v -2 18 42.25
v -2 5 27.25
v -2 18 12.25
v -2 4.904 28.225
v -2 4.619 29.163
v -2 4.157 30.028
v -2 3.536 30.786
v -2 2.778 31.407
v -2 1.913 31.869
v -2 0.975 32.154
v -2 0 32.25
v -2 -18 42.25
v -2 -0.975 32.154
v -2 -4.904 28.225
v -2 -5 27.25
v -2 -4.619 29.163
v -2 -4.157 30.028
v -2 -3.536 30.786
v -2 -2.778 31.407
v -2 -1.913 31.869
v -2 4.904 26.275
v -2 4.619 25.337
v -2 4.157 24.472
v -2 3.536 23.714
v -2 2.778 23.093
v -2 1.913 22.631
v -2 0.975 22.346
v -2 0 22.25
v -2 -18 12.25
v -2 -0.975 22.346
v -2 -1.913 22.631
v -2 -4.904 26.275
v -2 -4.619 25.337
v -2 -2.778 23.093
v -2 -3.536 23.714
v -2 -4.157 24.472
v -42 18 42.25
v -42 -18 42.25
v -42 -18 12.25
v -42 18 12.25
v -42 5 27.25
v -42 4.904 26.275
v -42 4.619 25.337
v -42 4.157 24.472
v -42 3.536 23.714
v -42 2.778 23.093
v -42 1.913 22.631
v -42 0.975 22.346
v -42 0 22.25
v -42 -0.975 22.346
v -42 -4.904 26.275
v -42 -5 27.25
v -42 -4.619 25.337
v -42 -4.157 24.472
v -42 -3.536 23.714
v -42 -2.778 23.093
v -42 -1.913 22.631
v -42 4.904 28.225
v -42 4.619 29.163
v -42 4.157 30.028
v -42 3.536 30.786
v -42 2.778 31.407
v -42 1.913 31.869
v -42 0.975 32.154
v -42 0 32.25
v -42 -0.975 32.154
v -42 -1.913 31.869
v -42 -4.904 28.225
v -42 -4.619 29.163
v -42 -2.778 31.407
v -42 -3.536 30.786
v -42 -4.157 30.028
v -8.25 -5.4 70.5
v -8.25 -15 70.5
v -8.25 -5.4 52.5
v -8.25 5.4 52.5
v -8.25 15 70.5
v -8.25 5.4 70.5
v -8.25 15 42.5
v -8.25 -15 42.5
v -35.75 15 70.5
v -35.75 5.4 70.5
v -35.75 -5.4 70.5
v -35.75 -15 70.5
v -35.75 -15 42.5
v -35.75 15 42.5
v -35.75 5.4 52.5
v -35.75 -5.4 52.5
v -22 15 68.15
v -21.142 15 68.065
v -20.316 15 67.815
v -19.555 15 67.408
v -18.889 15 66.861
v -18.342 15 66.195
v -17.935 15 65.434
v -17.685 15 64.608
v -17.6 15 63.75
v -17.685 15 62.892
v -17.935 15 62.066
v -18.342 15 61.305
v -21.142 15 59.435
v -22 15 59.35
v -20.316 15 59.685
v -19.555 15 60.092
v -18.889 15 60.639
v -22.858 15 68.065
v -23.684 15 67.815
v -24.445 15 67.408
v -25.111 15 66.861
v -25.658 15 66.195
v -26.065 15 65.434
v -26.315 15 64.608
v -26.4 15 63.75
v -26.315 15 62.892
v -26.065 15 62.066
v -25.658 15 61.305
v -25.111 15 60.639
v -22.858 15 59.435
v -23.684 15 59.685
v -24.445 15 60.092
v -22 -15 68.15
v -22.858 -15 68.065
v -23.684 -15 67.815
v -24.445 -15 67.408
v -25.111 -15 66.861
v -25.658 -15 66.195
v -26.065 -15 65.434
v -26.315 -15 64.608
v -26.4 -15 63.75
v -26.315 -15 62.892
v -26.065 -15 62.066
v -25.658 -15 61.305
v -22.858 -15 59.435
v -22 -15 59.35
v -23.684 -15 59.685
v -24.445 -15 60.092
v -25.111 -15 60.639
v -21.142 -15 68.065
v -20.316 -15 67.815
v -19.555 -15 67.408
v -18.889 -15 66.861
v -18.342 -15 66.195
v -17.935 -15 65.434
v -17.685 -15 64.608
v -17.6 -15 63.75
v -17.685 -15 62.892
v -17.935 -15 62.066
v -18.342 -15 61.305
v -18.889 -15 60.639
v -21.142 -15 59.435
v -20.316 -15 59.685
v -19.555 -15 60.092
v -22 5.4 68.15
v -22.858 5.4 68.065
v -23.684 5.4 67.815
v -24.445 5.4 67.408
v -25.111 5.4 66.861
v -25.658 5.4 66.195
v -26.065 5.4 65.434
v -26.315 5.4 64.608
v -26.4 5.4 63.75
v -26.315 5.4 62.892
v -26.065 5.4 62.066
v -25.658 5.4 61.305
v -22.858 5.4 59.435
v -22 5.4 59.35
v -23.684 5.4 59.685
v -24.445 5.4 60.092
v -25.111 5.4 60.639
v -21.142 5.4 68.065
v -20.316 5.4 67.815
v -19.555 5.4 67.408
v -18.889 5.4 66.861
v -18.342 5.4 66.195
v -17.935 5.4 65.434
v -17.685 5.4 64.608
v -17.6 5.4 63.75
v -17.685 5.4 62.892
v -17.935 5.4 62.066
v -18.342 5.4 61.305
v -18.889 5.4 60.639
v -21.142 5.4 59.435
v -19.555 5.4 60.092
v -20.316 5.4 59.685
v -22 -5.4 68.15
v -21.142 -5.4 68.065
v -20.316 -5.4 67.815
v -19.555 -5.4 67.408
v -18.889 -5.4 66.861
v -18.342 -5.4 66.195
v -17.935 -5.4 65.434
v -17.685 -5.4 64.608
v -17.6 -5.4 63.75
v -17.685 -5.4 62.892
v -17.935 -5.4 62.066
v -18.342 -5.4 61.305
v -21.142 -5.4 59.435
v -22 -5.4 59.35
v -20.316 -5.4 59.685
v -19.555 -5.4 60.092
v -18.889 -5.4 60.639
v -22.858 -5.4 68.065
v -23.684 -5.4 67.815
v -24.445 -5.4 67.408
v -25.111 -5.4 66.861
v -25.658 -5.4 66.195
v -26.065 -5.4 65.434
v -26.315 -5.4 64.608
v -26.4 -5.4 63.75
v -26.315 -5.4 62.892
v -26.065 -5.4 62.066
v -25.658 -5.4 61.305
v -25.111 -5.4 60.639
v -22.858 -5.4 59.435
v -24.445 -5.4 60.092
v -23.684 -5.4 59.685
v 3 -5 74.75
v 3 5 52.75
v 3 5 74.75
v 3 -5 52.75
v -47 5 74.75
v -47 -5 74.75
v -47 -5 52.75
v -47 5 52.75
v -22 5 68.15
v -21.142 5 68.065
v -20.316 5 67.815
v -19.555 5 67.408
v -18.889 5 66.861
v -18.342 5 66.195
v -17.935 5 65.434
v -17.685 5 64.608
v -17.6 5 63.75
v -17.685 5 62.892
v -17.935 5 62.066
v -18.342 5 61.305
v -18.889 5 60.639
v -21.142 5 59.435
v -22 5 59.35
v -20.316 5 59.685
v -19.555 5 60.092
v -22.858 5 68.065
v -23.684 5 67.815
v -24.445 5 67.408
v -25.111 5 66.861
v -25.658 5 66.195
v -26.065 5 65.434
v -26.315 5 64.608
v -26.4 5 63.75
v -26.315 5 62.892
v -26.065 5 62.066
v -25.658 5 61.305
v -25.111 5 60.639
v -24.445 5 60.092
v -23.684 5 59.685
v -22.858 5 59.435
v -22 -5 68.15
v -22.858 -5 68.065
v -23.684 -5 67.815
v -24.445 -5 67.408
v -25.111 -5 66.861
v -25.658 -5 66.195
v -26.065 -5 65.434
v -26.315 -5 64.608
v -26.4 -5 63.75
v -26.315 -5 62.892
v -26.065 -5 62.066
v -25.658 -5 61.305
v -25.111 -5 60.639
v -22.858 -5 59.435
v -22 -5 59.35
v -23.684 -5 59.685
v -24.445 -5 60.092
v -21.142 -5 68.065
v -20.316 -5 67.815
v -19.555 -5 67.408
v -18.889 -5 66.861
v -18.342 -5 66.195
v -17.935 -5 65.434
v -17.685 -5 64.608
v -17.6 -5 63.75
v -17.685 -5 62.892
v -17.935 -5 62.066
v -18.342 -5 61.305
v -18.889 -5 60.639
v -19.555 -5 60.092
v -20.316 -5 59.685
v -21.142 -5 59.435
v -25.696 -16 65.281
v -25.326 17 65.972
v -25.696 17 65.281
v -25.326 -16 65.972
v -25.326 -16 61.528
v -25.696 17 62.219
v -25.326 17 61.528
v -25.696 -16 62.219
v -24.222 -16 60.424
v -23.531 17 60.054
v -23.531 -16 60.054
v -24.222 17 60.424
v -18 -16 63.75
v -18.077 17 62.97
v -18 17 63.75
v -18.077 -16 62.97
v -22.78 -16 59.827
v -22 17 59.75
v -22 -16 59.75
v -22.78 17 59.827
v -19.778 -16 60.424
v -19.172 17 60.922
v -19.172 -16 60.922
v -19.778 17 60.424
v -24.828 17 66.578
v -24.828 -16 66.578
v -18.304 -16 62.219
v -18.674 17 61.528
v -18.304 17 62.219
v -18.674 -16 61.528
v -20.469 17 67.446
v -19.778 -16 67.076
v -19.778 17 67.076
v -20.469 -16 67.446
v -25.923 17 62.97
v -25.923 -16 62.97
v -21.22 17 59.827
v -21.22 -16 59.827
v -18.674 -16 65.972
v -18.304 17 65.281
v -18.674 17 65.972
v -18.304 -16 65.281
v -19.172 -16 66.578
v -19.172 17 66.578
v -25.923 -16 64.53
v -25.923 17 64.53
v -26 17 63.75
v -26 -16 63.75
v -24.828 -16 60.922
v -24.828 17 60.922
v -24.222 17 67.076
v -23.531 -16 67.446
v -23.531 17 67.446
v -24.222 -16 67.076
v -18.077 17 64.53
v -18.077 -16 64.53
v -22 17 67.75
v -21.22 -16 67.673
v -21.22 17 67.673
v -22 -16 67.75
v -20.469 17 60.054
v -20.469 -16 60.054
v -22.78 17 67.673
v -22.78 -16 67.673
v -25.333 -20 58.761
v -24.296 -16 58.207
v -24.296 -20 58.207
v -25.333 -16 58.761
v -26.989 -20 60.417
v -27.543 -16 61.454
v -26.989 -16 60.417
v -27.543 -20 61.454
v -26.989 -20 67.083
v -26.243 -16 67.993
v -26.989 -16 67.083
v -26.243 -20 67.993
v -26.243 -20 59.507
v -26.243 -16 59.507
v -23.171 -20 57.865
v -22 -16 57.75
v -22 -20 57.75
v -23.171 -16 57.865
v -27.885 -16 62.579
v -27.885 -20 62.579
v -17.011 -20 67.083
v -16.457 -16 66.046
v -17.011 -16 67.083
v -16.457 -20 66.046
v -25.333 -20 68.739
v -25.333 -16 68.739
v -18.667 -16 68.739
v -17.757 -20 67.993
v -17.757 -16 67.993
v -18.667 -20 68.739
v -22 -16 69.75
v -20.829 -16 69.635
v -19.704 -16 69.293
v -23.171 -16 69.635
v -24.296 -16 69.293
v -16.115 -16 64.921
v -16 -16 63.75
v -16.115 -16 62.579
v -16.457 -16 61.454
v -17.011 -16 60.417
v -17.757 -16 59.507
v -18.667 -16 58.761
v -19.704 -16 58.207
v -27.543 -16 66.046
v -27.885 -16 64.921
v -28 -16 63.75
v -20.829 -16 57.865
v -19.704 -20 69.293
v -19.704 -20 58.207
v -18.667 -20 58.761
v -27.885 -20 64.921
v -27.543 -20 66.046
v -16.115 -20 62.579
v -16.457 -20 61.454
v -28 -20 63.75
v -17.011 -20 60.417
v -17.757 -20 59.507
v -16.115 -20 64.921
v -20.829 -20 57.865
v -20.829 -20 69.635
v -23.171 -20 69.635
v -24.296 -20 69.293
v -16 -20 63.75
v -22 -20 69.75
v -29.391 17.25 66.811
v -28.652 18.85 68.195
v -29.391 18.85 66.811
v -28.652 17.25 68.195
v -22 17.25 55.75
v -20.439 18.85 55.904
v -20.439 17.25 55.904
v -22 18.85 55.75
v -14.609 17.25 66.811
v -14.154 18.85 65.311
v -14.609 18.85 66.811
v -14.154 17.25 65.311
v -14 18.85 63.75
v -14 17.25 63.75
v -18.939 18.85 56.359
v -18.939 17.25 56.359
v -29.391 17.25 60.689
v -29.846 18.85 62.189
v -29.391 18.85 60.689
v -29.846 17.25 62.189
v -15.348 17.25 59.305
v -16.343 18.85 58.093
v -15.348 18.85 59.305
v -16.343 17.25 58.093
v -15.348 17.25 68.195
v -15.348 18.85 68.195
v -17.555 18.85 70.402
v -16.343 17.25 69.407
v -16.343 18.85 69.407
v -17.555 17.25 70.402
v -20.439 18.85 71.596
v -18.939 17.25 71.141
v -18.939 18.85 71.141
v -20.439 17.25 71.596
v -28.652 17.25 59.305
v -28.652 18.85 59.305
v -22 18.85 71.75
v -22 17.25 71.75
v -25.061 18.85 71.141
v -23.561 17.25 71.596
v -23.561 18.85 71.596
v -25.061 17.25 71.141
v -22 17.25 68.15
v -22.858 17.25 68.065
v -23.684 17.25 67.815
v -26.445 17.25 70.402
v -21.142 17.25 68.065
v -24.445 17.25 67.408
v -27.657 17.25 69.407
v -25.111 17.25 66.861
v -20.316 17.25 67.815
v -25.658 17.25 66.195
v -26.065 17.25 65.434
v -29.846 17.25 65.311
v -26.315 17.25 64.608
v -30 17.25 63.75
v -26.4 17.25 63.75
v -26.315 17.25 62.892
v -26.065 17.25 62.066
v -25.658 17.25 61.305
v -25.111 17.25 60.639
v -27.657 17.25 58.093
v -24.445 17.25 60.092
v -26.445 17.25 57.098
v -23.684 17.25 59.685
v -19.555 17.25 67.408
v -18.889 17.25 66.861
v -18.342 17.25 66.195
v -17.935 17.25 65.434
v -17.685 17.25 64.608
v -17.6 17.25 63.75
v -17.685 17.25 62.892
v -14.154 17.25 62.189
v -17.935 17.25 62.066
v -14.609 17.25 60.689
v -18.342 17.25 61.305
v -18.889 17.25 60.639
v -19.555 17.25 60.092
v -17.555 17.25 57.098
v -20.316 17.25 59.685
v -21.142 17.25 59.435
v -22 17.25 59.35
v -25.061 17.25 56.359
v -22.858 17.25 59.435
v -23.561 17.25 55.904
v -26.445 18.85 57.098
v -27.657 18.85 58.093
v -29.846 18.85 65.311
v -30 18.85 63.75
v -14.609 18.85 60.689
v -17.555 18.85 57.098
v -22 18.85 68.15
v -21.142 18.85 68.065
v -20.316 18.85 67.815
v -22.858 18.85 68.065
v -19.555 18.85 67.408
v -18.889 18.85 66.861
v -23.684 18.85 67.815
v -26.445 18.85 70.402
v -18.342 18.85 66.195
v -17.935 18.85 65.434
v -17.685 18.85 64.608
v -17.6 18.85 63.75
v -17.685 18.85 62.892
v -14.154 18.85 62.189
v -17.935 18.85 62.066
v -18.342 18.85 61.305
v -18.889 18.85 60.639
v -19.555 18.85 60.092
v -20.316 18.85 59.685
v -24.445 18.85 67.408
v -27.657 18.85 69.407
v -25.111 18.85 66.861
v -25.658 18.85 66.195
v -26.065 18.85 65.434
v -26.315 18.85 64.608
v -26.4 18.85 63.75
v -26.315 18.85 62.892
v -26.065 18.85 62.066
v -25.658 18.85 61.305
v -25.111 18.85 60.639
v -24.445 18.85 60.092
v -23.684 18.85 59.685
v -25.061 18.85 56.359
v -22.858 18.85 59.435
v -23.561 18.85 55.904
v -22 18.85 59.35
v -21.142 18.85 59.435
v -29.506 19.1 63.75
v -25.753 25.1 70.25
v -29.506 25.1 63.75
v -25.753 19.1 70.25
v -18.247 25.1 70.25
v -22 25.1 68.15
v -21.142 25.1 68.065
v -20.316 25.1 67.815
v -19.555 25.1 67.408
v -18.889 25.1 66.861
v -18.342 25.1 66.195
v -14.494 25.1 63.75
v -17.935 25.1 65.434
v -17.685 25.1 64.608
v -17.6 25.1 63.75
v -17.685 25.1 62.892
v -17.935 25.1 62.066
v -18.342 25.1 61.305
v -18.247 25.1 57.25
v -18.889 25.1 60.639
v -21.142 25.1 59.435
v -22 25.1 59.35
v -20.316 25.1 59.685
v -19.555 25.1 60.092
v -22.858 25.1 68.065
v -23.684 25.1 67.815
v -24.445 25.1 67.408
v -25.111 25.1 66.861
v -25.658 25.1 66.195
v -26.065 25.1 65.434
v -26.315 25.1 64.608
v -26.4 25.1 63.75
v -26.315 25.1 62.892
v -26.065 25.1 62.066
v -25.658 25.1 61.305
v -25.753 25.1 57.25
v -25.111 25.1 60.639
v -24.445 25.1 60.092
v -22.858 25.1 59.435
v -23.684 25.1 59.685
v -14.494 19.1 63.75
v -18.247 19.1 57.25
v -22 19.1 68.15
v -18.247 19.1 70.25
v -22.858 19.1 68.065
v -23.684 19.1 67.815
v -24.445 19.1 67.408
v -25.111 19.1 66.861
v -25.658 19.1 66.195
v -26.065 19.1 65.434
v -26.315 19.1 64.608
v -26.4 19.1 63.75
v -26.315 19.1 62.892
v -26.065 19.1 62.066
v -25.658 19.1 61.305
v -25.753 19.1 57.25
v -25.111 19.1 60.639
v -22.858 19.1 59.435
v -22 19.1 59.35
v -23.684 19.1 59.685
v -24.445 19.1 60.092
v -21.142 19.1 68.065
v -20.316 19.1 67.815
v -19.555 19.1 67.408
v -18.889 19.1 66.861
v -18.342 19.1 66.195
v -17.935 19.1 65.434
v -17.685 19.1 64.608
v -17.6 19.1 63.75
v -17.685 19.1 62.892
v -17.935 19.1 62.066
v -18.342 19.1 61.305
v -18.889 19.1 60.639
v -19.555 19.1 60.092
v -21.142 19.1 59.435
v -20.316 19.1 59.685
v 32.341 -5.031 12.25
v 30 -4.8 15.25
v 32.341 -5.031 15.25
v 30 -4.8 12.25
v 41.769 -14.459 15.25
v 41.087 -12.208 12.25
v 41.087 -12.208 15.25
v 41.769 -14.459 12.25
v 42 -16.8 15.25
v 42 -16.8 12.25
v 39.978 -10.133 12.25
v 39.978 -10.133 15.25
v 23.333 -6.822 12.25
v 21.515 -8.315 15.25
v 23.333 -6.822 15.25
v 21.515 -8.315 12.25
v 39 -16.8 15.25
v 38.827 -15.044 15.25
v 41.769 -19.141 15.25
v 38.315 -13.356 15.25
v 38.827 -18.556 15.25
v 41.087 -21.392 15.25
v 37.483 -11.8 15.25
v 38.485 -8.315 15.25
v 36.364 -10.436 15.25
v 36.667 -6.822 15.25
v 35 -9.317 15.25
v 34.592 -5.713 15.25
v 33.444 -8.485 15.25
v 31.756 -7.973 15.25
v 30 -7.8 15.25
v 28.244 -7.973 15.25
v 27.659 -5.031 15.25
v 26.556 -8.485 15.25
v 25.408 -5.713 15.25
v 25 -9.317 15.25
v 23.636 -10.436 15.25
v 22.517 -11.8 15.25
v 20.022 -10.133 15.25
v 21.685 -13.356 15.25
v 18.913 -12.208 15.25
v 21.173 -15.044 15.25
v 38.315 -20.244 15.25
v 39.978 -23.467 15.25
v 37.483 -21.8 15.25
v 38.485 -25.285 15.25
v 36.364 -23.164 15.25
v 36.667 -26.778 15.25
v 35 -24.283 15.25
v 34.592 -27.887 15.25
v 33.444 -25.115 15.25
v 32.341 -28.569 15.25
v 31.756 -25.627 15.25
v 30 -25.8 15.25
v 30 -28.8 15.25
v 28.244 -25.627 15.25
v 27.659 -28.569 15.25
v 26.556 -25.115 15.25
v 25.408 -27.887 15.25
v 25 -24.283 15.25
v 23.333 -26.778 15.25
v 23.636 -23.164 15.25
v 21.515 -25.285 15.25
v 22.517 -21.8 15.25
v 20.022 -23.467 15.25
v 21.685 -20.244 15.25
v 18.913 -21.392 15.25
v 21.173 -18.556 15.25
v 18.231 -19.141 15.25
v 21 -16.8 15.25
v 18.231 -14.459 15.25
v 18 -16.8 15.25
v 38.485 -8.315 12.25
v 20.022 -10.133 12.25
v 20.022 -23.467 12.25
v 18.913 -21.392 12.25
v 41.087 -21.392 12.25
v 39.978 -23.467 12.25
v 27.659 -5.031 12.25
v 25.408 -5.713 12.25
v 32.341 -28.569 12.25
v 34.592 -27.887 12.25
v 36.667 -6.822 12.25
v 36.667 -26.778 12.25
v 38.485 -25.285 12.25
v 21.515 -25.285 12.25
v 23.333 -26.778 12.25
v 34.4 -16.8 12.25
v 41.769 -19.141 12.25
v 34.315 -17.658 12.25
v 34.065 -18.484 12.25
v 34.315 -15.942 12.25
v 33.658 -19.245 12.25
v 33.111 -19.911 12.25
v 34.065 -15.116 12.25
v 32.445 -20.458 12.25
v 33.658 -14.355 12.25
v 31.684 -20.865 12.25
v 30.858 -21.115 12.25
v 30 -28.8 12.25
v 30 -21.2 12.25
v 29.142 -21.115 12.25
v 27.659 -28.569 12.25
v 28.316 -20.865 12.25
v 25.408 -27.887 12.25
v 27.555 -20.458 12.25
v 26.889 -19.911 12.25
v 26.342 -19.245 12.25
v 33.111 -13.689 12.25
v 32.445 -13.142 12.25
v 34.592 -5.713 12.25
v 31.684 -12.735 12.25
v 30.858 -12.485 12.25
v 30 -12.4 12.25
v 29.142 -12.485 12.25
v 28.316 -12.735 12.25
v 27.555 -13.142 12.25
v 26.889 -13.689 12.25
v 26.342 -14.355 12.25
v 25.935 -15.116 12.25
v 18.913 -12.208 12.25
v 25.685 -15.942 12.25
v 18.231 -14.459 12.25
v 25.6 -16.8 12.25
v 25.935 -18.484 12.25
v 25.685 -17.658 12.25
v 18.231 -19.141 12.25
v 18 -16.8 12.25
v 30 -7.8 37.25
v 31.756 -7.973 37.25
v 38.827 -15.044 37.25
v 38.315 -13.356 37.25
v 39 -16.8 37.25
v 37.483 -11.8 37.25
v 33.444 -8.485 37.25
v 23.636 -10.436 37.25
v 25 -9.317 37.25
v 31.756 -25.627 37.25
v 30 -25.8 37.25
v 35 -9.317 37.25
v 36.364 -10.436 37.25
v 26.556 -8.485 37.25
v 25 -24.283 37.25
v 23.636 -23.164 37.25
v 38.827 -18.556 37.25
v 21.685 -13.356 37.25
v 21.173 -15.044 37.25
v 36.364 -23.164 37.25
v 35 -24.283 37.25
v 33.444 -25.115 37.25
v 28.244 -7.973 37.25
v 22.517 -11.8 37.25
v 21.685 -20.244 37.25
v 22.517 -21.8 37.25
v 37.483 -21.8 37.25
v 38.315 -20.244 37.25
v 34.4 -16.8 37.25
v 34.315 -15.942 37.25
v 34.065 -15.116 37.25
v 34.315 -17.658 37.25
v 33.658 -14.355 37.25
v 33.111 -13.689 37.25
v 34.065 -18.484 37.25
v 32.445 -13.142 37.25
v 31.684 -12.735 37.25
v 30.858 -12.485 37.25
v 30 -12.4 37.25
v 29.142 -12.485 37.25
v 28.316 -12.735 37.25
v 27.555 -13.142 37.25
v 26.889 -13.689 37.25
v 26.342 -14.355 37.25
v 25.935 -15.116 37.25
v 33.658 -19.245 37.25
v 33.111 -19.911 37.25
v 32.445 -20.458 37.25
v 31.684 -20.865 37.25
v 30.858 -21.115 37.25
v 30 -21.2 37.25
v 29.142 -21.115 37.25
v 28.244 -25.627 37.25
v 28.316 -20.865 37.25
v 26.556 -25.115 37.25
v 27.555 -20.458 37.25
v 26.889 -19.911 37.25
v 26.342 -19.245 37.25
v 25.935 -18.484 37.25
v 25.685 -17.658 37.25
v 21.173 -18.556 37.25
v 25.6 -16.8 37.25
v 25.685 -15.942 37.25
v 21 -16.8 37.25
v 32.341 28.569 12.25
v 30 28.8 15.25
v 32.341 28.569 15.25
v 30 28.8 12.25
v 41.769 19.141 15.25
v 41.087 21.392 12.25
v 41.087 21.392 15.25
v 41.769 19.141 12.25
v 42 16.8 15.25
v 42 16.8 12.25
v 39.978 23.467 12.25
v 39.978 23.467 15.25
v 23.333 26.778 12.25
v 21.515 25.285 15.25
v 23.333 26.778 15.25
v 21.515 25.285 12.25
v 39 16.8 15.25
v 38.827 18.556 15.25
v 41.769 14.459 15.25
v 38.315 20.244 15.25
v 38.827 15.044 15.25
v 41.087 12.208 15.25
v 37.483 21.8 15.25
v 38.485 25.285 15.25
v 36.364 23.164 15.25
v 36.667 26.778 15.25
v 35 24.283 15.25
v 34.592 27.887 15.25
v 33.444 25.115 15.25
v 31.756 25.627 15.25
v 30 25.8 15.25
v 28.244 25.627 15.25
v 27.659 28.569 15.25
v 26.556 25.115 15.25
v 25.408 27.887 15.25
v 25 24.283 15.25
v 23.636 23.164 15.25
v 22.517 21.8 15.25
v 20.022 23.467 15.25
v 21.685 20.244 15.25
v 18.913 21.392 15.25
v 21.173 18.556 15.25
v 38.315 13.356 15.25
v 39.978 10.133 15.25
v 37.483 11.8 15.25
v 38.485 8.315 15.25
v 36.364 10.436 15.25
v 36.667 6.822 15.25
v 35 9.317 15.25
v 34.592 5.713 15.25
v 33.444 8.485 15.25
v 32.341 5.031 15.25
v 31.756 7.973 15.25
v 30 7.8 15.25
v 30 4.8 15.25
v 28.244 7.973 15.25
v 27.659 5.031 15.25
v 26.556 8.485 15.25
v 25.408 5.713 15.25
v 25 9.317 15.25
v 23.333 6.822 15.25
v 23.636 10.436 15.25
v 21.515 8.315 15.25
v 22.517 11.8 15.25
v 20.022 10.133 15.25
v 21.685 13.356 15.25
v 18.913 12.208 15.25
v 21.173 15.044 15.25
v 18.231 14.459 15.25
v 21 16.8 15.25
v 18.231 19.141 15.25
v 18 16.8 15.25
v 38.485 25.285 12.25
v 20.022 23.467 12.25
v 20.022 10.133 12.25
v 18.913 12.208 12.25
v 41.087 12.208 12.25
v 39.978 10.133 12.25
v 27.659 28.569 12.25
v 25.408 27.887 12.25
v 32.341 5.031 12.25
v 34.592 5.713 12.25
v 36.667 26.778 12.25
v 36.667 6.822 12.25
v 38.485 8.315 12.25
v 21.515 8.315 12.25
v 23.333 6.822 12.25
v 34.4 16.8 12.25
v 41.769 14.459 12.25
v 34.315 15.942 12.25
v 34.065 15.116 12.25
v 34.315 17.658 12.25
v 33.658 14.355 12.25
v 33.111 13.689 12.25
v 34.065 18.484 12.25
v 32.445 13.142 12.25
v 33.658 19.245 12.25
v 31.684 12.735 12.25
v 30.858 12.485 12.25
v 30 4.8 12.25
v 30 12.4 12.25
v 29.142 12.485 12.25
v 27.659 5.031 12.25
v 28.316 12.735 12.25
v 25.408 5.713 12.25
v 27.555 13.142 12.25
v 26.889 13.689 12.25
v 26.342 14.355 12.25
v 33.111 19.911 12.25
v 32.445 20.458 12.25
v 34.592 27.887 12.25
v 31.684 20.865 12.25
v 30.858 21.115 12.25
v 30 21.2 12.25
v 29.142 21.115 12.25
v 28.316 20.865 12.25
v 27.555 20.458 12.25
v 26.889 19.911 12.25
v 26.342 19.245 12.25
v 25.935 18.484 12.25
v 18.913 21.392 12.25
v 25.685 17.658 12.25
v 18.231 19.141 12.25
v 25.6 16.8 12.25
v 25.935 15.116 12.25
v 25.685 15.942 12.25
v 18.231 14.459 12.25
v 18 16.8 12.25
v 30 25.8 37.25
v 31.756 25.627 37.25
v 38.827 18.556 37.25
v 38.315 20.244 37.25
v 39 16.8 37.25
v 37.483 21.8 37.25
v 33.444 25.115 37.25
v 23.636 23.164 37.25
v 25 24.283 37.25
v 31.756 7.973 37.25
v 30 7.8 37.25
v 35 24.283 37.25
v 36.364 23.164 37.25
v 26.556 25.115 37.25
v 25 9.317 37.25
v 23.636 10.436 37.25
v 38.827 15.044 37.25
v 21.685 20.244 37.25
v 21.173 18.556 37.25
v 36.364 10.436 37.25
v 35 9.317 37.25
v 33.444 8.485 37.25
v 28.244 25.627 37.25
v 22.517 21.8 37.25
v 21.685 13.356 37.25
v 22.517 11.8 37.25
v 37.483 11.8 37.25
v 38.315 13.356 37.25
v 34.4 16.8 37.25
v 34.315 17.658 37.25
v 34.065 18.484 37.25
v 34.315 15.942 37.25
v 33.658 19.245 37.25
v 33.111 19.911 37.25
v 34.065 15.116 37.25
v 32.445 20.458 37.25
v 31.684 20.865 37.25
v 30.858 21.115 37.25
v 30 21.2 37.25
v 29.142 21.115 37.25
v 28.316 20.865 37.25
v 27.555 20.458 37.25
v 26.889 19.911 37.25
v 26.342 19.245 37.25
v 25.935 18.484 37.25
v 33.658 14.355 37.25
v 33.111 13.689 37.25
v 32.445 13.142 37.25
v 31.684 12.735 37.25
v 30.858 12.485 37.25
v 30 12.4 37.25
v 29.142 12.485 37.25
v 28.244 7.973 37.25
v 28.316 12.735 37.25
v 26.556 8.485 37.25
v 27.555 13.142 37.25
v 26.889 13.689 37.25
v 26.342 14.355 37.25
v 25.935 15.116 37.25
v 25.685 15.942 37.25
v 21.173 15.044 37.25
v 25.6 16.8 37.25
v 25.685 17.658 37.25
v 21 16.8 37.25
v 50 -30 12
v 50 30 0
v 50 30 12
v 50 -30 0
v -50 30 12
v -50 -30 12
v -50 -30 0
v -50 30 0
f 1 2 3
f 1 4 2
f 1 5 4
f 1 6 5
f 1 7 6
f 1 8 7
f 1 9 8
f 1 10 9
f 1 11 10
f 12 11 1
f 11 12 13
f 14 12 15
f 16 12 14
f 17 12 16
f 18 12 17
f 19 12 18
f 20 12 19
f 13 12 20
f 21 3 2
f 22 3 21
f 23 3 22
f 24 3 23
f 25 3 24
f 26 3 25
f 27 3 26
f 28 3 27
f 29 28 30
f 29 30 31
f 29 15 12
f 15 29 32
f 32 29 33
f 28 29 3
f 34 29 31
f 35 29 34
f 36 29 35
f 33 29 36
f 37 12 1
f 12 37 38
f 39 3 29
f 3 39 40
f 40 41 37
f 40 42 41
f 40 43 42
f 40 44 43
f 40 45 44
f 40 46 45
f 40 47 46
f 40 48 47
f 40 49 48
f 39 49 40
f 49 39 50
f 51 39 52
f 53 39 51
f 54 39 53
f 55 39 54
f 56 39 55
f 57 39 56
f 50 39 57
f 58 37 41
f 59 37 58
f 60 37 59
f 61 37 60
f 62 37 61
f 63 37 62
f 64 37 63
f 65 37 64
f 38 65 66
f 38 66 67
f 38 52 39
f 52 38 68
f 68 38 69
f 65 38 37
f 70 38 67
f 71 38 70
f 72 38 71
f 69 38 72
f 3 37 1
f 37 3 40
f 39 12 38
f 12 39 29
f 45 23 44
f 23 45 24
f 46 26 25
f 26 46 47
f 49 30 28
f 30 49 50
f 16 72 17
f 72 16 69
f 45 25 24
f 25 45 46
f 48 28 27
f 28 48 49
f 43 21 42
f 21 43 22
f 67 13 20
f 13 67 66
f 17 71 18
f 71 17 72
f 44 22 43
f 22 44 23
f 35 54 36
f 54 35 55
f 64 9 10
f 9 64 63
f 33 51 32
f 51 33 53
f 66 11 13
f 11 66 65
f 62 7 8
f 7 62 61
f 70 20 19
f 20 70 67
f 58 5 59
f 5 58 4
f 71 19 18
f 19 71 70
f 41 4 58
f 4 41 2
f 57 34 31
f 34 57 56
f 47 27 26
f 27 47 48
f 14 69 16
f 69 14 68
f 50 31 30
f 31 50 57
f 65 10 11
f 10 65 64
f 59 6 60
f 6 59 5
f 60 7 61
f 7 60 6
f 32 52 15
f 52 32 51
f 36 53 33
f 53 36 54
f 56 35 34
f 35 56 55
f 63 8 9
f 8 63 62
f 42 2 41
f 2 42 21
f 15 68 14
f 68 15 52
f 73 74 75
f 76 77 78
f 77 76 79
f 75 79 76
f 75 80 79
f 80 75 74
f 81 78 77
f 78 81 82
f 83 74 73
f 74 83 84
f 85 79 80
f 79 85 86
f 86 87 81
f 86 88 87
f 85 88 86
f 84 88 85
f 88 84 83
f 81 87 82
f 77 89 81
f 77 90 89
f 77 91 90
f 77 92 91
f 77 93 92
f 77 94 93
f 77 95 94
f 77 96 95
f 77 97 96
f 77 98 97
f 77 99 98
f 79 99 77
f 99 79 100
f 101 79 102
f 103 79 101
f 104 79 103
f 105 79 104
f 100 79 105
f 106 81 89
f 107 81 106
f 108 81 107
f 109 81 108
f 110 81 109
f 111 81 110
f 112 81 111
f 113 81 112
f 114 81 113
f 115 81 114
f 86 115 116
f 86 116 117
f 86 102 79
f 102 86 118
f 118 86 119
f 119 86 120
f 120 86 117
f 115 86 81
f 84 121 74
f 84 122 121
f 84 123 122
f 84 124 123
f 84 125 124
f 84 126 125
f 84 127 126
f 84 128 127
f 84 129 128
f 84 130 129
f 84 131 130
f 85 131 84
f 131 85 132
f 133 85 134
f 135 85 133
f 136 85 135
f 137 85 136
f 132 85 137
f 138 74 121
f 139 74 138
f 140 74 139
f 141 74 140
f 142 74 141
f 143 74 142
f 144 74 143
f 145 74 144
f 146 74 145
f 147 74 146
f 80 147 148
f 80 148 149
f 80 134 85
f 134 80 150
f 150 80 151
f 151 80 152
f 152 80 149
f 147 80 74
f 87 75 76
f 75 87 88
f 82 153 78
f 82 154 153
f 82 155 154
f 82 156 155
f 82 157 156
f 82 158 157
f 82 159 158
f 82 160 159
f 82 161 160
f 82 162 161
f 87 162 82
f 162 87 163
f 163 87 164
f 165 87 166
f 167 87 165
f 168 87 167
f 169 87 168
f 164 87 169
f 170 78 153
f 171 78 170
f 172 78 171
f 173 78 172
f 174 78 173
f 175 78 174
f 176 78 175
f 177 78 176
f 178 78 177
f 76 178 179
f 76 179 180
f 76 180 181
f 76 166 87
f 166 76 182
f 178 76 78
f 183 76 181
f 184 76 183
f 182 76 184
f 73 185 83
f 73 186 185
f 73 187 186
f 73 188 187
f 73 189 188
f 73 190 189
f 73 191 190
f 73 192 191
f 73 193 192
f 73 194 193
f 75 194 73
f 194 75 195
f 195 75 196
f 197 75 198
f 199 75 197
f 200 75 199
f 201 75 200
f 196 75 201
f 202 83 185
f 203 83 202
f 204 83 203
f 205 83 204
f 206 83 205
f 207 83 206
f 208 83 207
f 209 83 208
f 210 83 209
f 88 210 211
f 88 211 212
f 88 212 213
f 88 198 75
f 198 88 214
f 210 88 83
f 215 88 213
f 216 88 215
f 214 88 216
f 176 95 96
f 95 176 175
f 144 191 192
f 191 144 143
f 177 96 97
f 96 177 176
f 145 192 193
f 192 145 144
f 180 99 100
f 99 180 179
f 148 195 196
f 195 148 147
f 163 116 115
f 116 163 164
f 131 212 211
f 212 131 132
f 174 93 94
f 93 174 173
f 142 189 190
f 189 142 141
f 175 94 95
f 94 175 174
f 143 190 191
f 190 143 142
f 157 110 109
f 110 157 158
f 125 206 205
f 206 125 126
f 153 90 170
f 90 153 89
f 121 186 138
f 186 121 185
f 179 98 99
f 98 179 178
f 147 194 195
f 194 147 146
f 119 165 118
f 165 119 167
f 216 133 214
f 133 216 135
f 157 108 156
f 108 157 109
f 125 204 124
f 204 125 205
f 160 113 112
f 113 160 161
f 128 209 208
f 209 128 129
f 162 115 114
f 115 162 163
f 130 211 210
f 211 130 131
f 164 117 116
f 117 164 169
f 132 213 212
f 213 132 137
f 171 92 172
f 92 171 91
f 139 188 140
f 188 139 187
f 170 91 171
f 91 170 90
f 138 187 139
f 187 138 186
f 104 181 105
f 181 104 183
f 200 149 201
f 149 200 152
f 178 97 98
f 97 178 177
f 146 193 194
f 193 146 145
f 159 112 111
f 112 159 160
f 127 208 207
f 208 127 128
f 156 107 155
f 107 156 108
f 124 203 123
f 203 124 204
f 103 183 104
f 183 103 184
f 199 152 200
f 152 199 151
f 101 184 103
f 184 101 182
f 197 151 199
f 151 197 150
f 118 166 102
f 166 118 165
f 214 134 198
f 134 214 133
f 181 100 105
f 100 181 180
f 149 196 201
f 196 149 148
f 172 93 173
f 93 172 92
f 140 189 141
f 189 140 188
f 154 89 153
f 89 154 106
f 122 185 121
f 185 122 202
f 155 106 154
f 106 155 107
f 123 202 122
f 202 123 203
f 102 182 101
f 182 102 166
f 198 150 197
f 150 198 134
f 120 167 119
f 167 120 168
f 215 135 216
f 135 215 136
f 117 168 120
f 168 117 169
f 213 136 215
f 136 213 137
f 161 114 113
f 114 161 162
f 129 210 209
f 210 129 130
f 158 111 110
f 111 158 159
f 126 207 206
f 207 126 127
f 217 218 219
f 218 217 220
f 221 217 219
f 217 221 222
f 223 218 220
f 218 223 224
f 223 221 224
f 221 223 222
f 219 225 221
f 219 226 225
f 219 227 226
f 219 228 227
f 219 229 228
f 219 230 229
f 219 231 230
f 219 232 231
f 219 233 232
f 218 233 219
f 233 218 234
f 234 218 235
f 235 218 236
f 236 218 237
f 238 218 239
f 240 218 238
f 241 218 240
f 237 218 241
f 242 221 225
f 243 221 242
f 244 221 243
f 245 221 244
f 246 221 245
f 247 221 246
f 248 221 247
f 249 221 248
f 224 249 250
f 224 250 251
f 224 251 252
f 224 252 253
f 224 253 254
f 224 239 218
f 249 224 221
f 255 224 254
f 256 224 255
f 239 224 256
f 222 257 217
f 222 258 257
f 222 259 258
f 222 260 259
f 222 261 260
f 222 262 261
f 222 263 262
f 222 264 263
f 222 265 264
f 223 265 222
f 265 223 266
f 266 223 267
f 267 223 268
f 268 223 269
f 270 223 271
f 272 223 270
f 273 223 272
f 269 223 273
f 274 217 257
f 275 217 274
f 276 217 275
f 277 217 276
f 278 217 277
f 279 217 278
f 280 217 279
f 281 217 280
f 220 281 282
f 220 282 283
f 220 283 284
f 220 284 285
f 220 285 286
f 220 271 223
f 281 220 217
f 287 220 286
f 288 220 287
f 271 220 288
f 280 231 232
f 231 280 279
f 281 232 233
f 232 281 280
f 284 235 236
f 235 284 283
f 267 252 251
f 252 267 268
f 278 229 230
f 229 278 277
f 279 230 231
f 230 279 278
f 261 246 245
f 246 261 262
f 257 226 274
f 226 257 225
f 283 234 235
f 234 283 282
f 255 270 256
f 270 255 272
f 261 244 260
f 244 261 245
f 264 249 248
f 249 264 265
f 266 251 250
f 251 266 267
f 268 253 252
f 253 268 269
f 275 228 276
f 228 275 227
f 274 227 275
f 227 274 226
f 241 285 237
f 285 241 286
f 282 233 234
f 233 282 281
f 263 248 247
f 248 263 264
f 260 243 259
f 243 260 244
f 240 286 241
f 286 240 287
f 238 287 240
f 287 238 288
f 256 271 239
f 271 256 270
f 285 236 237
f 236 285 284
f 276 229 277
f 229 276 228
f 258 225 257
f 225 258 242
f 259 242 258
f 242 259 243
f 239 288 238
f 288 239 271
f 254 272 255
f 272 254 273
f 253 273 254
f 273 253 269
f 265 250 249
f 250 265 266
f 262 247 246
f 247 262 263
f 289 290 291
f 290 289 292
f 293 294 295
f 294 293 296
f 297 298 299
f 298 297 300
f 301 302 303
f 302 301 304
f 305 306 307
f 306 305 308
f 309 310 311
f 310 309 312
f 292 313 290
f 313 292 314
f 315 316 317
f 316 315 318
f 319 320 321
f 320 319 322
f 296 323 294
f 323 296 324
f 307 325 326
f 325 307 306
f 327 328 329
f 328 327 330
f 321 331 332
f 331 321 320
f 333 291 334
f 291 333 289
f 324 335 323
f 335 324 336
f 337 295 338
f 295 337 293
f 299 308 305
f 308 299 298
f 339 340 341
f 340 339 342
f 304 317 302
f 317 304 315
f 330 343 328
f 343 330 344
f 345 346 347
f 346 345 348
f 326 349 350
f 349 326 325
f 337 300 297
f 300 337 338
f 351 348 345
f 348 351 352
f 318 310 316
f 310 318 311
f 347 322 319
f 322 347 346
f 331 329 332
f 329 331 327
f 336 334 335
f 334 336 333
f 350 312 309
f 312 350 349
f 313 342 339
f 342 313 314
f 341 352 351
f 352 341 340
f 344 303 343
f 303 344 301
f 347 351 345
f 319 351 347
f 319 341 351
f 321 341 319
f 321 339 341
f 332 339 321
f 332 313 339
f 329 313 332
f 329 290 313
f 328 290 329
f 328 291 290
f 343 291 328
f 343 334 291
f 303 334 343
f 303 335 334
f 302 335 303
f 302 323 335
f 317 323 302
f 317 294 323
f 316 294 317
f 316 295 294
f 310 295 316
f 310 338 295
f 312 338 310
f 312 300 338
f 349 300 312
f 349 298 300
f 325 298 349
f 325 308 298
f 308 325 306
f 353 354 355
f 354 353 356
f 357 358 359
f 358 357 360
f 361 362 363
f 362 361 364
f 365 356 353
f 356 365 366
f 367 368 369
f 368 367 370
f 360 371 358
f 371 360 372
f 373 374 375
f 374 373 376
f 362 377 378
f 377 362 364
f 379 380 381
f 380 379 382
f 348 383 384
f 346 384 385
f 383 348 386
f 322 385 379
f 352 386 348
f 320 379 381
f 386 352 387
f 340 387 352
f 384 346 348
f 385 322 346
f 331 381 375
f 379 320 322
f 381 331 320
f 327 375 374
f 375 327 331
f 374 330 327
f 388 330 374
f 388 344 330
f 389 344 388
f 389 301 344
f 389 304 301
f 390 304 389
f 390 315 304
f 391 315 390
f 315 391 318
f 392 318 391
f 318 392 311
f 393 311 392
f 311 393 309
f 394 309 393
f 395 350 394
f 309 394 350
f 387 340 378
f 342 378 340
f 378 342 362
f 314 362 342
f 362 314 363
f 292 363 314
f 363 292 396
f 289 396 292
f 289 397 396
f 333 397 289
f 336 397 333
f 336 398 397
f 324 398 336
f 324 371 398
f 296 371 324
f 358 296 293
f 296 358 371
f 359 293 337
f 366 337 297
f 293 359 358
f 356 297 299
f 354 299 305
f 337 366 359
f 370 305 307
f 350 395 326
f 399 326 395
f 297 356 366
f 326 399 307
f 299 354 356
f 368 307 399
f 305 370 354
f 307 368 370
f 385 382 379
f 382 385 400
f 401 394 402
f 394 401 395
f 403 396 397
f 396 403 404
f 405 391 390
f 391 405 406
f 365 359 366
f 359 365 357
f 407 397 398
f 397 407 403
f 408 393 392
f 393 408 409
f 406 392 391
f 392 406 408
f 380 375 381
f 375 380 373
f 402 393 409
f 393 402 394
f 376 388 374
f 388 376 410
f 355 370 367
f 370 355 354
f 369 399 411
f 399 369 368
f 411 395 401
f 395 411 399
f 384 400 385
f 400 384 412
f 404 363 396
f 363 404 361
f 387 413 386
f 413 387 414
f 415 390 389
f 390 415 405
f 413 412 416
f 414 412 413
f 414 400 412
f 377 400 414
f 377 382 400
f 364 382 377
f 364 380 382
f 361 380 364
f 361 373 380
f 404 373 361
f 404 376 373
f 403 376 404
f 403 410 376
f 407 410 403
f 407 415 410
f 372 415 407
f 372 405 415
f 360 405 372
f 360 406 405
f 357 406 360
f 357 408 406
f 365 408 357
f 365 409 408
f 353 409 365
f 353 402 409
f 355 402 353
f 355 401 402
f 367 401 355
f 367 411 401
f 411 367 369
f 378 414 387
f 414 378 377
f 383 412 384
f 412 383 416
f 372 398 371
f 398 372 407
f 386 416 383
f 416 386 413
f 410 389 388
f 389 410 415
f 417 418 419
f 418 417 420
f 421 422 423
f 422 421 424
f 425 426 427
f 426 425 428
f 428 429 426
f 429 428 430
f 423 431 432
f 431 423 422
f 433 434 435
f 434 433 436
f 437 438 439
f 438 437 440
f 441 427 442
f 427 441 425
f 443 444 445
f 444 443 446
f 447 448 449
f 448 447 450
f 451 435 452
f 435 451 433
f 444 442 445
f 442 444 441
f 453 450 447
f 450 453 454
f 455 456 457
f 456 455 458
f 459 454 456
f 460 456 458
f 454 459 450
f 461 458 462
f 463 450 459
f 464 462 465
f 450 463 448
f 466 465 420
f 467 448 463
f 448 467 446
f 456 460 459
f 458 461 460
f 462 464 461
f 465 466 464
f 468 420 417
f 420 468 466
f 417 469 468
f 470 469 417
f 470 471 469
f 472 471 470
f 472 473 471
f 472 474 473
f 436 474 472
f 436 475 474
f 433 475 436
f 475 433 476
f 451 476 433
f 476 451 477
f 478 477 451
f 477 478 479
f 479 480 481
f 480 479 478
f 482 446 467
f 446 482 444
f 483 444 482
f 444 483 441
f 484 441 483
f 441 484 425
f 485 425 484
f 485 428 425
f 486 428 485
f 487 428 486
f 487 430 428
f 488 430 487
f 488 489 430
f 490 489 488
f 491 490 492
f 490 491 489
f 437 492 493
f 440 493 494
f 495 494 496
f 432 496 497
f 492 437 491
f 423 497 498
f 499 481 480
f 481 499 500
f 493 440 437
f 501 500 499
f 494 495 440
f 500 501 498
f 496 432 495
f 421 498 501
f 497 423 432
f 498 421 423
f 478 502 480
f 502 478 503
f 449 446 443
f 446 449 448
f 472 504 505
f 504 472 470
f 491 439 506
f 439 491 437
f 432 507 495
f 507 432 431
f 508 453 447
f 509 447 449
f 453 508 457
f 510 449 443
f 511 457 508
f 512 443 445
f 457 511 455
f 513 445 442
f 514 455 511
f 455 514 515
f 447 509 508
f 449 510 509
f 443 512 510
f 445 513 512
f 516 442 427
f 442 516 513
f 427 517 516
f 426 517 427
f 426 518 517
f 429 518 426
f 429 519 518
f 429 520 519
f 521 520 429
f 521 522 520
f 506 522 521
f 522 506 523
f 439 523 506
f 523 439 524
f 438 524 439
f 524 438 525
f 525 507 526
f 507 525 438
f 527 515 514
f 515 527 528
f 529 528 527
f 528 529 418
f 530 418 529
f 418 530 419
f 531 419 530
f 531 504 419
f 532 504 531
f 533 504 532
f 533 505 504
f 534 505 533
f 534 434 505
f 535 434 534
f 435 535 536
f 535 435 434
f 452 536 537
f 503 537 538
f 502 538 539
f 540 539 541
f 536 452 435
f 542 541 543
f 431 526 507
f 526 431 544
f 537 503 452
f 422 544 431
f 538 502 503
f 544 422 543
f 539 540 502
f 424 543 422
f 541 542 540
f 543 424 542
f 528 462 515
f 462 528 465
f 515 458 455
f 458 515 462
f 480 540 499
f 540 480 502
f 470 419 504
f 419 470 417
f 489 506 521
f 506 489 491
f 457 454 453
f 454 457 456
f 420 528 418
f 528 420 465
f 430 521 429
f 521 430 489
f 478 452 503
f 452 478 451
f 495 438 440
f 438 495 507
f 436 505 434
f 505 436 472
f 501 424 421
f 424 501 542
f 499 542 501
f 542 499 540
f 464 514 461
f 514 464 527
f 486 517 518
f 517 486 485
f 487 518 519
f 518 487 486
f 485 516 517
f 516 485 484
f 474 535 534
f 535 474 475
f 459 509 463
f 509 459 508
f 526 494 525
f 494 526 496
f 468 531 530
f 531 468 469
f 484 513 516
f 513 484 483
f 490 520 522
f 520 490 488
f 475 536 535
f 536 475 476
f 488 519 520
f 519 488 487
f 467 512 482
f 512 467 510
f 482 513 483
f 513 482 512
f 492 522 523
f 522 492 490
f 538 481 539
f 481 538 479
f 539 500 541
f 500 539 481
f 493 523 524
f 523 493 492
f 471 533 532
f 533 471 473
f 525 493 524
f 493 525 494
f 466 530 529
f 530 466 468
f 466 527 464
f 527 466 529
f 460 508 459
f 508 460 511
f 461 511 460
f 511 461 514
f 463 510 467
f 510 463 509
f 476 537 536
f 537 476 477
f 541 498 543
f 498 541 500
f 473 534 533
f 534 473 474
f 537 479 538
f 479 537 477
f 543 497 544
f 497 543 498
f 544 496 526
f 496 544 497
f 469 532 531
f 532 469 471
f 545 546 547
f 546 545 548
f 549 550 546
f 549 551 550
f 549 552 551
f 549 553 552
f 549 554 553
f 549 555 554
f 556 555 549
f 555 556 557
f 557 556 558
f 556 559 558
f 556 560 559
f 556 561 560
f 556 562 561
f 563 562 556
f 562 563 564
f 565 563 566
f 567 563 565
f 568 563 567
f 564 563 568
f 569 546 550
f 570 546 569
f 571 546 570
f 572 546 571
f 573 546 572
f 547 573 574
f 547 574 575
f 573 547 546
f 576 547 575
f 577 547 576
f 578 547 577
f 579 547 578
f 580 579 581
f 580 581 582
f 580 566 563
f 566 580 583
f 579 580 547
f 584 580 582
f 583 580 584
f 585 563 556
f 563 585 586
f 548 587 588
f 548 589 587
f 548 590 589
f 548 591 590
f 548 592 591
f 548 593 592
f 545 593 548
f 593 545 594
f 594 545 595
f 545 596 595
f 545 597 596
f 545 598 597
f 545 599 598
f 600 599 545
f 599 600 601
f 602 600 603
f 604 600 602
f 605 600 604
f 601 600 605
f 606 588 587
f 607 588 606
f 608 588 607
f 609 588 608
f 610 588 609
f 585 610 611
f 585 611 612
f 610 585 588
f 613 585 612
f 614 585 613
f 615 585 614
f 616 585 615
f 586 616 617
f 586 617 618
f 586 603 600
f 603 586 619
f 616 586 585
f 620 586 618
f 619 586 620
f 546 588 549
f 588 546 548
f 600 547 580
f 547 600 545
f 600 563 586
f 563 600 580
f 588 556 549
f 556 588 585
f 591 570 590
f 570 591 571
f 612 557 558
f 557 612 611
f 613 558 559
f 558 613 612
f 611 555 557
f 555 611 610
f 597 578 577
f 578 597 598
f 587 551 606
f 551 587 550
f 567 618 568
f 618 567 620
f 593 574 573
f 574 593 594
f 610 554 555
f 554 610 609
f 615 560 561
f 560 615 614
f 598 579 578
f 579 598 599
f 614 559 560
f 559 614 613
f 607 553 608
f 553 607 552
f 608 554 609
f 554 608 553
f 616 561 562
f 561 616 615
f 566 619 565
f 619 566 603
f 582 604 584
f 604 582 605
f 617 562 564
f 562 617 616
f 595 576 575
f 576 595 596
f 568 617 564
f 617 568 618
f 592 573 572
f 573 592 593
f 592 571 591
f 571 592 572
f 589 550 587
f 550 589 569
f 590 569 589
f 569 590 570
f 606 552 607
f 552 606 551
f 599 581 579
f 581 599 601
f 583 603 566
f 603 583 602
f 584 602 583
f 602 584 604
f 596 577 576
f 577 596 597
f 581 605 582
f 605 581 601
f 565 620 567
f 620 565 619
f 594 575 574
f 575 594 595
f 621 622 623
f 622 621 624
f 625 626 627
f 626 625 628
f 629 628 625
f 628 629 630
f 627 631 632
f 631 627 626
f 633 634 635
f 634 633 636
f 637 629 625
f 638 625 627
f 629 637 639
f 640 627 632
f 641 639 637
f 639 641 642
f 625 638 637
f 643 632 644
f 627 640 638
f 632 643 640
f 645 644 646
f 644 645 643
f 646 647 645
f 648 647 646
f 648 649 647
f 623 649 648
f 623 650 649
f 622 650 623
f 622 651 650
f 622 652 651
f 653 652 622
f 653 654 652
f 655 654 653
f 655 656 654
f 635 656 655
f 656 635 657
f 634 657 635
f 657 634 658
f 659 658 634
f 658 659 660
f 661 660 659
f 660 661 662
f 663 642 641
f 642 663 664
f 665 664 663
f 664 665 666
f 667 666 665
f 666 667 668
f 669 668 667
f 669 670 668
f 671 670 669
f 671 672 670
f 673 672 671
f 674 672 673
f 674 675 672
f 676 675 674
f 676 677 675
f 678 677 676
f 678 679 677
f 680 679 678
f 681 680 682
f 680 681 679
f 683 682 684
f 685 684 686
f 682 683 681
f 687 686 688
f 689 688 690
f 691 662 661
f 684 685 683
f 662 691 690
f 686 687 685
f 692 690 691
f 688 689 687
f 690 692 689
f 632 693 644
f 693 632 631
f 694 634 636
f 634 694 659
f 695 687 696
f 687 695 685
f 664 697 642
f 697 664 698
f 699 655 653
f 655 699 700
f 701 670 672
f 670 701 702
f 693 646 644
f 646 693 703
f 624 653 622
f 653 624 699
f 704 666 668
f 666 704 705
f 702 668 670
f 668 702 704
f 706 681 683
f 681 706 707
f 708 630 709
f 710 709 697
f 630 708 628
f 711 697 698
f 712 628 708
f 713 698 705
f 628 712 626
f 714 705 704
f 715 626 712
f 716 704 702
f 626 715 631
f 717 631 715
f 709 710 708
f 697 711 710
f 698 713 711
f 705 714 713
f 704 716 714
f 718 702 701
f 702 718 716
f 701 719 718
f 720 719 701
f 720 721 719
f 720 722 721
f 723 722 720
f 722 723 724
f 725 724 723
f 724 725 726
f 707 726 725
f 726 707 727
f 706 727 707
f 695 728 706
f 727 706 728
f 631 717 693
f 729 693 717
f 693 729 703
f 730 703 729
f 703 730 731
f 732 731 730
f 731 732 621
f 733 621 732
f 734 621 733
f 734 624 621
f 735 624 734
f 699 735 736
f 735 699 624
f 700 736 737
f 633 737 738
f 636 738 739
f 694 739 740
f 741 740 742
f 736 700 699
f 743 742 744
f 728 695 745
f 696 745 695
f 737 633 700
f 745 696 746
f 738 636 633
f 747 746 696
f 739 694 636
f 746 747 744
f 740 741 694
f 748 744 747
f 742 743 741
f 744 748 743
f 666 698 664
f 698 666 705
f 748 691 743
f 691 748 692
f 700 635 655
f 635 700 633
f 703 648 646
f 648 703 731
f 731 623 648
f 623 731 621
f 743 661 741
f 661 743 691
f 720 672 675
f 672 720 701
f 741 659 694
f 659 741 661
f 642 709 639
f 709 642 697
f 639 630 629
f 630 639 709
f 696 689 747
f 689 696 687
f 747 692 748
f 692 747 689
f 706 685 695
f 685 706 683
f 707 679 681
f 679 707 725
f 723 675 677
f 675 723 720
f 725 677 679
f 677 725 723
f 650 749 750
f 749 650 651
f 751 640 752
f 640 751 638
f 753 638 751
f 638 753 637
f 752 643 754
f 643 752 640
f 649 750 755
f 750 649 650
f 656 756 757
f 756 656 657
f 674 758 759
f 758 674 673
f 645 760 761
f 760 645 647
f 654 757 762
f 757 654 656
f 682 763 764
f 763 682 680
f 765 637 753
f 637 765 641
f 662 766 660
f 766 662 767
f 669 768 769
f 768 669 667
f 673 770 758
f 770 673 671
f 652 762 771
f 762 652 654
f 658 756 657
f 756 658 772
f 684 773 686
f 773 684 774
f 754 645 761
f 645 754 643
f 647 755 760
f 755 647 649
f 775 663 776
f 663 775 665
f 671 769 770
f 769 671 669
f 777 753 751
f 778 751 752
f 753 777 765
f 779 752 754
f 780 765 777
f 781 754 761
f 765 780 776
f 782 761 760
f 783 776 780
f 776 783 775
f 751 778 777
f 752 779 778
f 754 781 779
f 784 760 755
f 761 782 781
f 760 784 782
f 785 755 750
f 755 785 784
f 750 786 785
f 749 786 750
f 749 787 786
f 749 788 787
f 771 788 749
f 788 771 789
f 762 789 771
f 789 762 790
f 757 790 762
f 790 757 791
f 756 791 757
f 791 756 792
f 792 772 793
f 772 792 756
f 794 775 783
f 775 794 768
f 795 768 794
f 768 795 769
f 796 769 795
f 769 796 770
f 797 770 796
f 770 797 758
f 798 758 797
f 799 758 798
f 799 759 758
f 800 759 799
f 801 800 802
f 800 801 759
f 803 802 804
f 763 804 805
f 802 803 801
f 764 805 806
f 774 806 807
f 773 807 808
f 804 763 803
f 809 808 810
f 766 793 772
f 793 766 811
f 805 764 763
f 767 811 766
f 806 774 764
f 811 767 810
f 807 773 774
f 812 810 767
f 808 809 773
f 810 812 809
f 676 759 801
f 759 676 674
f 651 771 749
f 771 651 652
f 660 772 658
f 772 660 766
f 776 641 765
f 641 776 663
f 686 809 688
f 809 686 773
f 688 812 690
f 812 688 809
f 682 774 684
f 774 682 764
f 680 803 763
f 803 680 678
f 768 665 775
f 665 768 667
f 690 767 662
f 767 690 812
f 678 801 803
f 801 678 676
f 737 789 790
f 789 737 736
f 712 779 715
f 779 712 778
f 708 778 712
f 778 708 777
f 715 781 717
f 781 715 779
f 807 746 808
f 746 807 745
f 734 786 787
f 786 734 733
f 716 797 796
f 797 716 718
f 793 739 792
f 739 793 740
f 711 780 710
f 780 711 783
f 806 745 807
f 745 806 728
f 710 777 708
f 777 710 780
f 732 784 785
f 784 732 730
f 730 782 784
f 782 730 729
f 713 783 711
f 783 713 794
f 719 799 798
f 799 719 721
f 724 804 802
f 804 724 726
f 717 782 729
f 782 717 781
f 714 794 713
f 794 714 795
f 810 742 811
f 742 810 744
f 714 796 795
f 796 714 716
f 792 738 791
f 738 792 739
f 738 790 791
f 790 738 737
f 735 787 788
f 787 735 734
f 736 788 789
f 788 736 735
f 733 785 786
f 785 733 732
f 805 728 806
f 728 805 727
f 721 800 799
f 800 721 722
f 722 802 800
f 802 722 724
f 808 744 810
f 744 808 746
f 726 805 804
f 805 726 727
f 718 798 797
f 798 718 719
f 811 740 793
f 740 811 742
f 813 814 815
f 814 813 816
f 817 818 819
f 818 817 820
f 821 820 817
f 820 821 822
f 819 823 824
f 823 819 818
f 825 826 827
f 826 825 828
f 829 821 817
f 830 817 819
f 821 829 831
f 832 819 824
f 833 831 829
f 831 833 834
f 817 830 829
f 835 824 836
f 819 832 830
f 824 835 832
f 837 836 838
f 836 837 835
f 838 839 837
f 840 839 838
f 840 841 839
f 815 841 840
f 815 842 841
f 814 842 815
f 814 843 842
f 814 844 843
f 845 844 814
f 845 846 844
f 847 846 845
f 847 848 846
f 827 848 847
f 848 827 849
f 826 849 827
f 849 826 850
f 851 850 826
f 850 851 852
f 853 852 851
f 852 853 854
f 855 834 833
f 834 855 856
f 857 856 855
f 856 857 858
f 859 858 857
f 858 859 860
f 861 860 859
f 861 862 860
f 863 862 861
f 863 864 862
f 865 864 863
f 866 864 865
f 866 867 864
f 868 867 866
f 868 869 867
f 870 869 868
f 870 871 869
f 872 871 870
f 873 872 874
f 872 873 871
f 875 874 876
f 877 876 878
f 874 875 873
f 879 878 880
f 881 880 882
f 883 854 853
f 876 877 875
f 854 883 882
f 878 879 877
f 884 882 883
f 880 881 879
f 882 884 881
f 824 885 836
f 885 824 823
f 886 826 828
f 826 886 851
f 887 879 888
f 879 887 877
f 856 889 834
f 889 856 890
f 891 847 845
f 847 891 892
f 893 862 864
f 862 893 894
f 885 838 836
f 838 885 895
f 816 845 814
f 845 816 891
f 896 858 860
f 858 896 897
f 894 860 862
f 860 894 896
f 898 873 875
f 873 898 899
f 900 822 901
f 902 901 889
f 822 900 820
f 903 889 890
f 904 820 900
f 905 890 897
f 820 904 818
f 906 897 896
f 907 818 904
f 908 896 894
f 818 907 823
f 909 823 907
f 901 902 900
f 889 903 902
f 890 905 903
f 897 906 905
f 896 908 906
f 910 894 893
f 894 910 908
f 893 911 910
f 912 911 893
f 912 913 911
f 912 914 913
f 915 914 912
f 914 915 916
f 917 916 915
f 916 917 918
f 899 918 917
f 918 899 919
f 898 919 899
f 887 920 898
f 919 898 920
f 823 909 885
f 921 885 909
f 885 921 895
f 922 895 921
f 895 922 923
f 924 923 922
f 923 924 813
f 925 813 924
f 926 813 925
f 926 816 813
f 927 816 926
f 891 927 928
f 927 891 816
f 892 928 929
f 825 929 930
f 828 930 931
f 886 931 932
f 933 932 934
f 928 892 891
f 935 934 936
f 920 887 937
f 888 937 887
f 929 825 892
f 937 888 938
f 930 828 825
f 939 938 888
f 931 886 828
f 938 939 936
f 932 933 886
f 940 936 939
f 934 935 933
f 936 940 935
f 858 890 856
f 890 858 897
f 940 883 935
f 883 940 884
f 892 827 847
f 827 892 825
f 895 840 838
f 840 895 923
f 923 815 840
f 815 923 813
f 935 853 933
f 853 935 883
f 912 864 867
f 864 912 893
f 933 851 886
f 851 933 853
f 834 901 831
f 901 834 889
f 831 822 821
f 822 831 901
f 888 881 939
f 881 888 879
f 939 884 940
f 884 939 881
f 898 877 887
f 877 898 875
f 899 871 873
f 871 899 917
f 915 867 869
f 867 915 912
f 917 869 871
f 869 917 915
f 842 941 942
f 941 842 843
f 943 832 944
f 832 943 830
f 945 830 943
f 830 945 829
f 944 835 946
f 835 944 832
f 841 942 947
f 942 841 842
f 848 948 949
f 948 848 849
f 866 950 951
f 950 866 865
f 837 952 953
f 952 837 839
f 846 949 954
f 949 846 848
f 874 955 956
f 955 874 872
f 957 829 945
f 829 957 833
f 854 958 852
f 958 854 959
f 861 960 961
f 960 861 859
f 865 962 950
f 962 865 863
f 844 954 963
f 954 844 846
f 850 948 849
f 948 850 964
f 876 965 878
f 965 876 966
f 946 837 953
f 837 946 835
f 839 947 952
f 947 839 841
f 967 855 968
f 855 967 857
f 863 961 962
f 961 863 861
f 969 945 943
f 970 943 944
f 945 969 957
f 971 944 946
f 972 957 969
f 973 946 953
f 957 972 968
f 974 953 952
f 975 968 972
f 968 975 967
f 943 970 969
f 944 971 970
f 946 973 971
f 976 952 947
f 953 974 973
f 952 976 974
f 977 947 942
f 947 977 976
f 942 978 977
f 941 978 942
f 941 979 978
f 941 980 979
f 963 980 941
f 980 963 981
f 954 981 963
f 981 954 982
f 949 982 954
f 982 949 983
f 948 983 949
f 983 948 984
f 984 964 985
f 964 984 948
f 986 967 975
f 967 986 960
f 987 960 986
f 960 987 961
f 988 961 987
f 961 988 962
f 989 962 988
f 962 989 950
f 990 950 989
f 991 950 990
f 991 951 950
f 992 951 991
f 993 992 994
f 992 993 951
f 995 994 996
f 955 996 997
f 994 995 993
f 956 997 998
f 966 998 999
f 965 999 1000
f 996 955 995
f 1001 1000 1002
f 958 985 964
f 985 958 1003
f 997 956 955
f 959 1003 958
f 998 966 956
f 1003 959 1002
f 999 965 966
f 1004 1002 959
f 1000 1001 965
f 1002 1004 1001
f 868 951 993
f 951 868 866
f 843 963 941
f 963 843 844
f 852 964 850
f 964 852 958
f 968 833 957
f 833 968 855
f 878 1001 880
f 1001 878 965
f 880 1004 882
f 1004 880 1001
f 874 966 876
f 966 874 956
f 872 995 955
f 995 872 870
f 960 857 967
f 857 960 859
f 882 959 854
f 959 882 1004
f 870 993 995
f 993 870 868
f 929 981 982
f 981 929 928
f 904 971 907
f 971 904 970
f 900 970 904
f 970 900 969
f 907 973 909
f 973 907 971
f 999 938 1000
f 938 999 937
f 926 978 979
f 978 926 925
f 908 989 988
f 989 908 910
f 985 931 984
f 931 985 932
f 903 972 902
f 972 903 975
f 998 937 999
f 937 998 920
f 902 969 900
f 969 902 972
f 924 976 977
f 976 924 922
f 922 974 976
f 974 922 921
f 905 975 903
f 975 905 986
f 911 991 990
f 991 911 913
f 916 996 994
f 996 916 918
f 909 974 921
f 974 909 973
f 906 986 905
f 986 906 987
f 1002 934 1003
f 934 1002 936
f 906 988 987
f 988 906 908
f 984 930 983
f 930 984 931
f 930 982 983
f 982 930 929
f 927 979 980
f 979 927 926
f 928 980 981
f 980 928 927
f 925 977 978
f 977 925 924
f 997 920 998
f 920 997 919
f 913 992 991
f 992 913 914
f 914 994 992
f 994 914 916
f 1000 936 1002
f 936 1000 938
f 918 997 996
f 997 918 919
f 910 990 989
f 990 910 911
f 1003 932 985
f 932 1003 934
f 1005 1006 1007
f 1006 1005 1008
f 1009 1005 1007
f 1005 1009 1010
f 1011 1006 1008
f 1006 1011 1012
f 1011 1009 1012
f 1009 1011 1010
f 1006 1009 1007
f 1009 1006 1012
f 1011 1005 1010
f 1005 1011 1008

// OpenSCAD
$fn = 32;

// ------------------------------------------------------------------------
// Indexing jig: plate 100 x 60 mm, pin d8
// Every part is its own module, assembly() places every instance.
// ------------------------------------------------------------------------

// --- part 1 ---
module jig_plate() {
  difference() {
    translate([-50, -30, 0]) cube([100, 60, 12]);
  }
}

// --- part 2 ---
module locator_block() {
  difference() {
    translate([-20, -18, 0]) cube([40, 36, 30]);
    translate([0, 0, 15]) rotate([0, 90, 0]) cylinder(h = 42, d = 10, center = true);
  }
}

// --- part 3 ---
module index_fork() {
  difference() {
    translate([-13.75, -15, 0]) cube([27.5, 30, 28]);
    translate([-14.75, -5.4, 10]) cube([29.5, 10.8, 19]);
    translate([0, 0, 21.25]) rotate([90, 0, 0]) cylinder(h = 32, d = 8.8, center = true);
  }
}

// --- part 4 ---
module index_arm() {
  difference() {
    translate([-25, -5, 0]) cube([50, 10, 22]);
    translate([0, 0, 11]) rotate([90, 0, 0]) cylinder(h = 12, d = 8.8, center = true);
  }
}

// --- part 5 ---
module index_pin() {
  rotate([0, 90, 0]) cylinder(h = 34, d = 8, center = true);
  translate([-20, 0, 0]) rotate([0, 90, 0]) cylinder(h = 4, d = 12);
}

// --- part 6 ---
module pin_washer() {
  difference() {
      translate([0, 0, 0]) cylinder(h = 1.6, d = 16);
      translate([0, 0, -1]) cylinder(h = 3.6, d = 8.8);
    }
}

// --- part 7 ---
module lock_nut() {
  difference() {
    linear_extrude(height = 6) polygon(points = [[7.506, 0], [3.753, 6.5], [-3.753, 6.5], [-7.506, 0], [-3.753, -6.5], [3.753, -6.5]]);
    translate([0, 0, -1]) cylinder(h = 8, d = 8.8);
  }
}

// --- part 8 ---
module guide_bush_a() {
  difference() {
    union() {
      cylinder(h = 3, d = 24);
      translate([0, 0, 3]) cylinder(h = 22, d = 18);
    }
    translate([0, 0, -1]) cylinder(h = 27, d = 8.8);
  }
}

// --- part 9 ---
module guide_bush_b() {
  difference() {
    union() {
      cylinder(h = 3, d = 24);
      translate([0, 0, 3]) cylinder(h = 22, d = 18);
    }
    translate([0, 0, -1]) cylinder(h = 27, d = 8.8);
  }
}

// --- assembly ---
module assembly() {
  color([0.80, 0.24, 0.20]) translate([0, 0, 0]) rotate([0, 0, 0]) jig_plate();
  color([0.20, 0.45, 0.75]) translate([-22, 0, 12.25]) rotate([0, 0, 0]) locator_block();
  color([0.25, 0.62, 0.32]) translate([-22, 0, 42.5]) rotate([0, 0, 0]) index_fork();
  color([0.92, 0.70, 0.18]) translate([-22, 0, 52.75]) rotate([0, 0, 0]) index_arm();
  color([0.58, 0.35, 0.70]) translate([-22, 0, 63.75]) rotate([0, 0, 90]) index_pin();
  color([0.16, 0.66, 0.66]) translate([-22, 18.85, 63.75]) rotate([90, 0, 0]) pin_washer();
  color([0.85, 0.48, 0.18]) translate([-22, 25.1, 63.75]) rotate([90, 0, 0]) lock_nut();
  color([0.55, 0.60, 0.65]) translate([30, -16.8, 12.25]) rotate([0, 0, 0]) guide_bush_a();
  color([0.75, 0.30, 0.55]) translate([30, 16.8, 12.25]) rotate([0, 0, 0]) guide_bush_b();
}

assembly();
